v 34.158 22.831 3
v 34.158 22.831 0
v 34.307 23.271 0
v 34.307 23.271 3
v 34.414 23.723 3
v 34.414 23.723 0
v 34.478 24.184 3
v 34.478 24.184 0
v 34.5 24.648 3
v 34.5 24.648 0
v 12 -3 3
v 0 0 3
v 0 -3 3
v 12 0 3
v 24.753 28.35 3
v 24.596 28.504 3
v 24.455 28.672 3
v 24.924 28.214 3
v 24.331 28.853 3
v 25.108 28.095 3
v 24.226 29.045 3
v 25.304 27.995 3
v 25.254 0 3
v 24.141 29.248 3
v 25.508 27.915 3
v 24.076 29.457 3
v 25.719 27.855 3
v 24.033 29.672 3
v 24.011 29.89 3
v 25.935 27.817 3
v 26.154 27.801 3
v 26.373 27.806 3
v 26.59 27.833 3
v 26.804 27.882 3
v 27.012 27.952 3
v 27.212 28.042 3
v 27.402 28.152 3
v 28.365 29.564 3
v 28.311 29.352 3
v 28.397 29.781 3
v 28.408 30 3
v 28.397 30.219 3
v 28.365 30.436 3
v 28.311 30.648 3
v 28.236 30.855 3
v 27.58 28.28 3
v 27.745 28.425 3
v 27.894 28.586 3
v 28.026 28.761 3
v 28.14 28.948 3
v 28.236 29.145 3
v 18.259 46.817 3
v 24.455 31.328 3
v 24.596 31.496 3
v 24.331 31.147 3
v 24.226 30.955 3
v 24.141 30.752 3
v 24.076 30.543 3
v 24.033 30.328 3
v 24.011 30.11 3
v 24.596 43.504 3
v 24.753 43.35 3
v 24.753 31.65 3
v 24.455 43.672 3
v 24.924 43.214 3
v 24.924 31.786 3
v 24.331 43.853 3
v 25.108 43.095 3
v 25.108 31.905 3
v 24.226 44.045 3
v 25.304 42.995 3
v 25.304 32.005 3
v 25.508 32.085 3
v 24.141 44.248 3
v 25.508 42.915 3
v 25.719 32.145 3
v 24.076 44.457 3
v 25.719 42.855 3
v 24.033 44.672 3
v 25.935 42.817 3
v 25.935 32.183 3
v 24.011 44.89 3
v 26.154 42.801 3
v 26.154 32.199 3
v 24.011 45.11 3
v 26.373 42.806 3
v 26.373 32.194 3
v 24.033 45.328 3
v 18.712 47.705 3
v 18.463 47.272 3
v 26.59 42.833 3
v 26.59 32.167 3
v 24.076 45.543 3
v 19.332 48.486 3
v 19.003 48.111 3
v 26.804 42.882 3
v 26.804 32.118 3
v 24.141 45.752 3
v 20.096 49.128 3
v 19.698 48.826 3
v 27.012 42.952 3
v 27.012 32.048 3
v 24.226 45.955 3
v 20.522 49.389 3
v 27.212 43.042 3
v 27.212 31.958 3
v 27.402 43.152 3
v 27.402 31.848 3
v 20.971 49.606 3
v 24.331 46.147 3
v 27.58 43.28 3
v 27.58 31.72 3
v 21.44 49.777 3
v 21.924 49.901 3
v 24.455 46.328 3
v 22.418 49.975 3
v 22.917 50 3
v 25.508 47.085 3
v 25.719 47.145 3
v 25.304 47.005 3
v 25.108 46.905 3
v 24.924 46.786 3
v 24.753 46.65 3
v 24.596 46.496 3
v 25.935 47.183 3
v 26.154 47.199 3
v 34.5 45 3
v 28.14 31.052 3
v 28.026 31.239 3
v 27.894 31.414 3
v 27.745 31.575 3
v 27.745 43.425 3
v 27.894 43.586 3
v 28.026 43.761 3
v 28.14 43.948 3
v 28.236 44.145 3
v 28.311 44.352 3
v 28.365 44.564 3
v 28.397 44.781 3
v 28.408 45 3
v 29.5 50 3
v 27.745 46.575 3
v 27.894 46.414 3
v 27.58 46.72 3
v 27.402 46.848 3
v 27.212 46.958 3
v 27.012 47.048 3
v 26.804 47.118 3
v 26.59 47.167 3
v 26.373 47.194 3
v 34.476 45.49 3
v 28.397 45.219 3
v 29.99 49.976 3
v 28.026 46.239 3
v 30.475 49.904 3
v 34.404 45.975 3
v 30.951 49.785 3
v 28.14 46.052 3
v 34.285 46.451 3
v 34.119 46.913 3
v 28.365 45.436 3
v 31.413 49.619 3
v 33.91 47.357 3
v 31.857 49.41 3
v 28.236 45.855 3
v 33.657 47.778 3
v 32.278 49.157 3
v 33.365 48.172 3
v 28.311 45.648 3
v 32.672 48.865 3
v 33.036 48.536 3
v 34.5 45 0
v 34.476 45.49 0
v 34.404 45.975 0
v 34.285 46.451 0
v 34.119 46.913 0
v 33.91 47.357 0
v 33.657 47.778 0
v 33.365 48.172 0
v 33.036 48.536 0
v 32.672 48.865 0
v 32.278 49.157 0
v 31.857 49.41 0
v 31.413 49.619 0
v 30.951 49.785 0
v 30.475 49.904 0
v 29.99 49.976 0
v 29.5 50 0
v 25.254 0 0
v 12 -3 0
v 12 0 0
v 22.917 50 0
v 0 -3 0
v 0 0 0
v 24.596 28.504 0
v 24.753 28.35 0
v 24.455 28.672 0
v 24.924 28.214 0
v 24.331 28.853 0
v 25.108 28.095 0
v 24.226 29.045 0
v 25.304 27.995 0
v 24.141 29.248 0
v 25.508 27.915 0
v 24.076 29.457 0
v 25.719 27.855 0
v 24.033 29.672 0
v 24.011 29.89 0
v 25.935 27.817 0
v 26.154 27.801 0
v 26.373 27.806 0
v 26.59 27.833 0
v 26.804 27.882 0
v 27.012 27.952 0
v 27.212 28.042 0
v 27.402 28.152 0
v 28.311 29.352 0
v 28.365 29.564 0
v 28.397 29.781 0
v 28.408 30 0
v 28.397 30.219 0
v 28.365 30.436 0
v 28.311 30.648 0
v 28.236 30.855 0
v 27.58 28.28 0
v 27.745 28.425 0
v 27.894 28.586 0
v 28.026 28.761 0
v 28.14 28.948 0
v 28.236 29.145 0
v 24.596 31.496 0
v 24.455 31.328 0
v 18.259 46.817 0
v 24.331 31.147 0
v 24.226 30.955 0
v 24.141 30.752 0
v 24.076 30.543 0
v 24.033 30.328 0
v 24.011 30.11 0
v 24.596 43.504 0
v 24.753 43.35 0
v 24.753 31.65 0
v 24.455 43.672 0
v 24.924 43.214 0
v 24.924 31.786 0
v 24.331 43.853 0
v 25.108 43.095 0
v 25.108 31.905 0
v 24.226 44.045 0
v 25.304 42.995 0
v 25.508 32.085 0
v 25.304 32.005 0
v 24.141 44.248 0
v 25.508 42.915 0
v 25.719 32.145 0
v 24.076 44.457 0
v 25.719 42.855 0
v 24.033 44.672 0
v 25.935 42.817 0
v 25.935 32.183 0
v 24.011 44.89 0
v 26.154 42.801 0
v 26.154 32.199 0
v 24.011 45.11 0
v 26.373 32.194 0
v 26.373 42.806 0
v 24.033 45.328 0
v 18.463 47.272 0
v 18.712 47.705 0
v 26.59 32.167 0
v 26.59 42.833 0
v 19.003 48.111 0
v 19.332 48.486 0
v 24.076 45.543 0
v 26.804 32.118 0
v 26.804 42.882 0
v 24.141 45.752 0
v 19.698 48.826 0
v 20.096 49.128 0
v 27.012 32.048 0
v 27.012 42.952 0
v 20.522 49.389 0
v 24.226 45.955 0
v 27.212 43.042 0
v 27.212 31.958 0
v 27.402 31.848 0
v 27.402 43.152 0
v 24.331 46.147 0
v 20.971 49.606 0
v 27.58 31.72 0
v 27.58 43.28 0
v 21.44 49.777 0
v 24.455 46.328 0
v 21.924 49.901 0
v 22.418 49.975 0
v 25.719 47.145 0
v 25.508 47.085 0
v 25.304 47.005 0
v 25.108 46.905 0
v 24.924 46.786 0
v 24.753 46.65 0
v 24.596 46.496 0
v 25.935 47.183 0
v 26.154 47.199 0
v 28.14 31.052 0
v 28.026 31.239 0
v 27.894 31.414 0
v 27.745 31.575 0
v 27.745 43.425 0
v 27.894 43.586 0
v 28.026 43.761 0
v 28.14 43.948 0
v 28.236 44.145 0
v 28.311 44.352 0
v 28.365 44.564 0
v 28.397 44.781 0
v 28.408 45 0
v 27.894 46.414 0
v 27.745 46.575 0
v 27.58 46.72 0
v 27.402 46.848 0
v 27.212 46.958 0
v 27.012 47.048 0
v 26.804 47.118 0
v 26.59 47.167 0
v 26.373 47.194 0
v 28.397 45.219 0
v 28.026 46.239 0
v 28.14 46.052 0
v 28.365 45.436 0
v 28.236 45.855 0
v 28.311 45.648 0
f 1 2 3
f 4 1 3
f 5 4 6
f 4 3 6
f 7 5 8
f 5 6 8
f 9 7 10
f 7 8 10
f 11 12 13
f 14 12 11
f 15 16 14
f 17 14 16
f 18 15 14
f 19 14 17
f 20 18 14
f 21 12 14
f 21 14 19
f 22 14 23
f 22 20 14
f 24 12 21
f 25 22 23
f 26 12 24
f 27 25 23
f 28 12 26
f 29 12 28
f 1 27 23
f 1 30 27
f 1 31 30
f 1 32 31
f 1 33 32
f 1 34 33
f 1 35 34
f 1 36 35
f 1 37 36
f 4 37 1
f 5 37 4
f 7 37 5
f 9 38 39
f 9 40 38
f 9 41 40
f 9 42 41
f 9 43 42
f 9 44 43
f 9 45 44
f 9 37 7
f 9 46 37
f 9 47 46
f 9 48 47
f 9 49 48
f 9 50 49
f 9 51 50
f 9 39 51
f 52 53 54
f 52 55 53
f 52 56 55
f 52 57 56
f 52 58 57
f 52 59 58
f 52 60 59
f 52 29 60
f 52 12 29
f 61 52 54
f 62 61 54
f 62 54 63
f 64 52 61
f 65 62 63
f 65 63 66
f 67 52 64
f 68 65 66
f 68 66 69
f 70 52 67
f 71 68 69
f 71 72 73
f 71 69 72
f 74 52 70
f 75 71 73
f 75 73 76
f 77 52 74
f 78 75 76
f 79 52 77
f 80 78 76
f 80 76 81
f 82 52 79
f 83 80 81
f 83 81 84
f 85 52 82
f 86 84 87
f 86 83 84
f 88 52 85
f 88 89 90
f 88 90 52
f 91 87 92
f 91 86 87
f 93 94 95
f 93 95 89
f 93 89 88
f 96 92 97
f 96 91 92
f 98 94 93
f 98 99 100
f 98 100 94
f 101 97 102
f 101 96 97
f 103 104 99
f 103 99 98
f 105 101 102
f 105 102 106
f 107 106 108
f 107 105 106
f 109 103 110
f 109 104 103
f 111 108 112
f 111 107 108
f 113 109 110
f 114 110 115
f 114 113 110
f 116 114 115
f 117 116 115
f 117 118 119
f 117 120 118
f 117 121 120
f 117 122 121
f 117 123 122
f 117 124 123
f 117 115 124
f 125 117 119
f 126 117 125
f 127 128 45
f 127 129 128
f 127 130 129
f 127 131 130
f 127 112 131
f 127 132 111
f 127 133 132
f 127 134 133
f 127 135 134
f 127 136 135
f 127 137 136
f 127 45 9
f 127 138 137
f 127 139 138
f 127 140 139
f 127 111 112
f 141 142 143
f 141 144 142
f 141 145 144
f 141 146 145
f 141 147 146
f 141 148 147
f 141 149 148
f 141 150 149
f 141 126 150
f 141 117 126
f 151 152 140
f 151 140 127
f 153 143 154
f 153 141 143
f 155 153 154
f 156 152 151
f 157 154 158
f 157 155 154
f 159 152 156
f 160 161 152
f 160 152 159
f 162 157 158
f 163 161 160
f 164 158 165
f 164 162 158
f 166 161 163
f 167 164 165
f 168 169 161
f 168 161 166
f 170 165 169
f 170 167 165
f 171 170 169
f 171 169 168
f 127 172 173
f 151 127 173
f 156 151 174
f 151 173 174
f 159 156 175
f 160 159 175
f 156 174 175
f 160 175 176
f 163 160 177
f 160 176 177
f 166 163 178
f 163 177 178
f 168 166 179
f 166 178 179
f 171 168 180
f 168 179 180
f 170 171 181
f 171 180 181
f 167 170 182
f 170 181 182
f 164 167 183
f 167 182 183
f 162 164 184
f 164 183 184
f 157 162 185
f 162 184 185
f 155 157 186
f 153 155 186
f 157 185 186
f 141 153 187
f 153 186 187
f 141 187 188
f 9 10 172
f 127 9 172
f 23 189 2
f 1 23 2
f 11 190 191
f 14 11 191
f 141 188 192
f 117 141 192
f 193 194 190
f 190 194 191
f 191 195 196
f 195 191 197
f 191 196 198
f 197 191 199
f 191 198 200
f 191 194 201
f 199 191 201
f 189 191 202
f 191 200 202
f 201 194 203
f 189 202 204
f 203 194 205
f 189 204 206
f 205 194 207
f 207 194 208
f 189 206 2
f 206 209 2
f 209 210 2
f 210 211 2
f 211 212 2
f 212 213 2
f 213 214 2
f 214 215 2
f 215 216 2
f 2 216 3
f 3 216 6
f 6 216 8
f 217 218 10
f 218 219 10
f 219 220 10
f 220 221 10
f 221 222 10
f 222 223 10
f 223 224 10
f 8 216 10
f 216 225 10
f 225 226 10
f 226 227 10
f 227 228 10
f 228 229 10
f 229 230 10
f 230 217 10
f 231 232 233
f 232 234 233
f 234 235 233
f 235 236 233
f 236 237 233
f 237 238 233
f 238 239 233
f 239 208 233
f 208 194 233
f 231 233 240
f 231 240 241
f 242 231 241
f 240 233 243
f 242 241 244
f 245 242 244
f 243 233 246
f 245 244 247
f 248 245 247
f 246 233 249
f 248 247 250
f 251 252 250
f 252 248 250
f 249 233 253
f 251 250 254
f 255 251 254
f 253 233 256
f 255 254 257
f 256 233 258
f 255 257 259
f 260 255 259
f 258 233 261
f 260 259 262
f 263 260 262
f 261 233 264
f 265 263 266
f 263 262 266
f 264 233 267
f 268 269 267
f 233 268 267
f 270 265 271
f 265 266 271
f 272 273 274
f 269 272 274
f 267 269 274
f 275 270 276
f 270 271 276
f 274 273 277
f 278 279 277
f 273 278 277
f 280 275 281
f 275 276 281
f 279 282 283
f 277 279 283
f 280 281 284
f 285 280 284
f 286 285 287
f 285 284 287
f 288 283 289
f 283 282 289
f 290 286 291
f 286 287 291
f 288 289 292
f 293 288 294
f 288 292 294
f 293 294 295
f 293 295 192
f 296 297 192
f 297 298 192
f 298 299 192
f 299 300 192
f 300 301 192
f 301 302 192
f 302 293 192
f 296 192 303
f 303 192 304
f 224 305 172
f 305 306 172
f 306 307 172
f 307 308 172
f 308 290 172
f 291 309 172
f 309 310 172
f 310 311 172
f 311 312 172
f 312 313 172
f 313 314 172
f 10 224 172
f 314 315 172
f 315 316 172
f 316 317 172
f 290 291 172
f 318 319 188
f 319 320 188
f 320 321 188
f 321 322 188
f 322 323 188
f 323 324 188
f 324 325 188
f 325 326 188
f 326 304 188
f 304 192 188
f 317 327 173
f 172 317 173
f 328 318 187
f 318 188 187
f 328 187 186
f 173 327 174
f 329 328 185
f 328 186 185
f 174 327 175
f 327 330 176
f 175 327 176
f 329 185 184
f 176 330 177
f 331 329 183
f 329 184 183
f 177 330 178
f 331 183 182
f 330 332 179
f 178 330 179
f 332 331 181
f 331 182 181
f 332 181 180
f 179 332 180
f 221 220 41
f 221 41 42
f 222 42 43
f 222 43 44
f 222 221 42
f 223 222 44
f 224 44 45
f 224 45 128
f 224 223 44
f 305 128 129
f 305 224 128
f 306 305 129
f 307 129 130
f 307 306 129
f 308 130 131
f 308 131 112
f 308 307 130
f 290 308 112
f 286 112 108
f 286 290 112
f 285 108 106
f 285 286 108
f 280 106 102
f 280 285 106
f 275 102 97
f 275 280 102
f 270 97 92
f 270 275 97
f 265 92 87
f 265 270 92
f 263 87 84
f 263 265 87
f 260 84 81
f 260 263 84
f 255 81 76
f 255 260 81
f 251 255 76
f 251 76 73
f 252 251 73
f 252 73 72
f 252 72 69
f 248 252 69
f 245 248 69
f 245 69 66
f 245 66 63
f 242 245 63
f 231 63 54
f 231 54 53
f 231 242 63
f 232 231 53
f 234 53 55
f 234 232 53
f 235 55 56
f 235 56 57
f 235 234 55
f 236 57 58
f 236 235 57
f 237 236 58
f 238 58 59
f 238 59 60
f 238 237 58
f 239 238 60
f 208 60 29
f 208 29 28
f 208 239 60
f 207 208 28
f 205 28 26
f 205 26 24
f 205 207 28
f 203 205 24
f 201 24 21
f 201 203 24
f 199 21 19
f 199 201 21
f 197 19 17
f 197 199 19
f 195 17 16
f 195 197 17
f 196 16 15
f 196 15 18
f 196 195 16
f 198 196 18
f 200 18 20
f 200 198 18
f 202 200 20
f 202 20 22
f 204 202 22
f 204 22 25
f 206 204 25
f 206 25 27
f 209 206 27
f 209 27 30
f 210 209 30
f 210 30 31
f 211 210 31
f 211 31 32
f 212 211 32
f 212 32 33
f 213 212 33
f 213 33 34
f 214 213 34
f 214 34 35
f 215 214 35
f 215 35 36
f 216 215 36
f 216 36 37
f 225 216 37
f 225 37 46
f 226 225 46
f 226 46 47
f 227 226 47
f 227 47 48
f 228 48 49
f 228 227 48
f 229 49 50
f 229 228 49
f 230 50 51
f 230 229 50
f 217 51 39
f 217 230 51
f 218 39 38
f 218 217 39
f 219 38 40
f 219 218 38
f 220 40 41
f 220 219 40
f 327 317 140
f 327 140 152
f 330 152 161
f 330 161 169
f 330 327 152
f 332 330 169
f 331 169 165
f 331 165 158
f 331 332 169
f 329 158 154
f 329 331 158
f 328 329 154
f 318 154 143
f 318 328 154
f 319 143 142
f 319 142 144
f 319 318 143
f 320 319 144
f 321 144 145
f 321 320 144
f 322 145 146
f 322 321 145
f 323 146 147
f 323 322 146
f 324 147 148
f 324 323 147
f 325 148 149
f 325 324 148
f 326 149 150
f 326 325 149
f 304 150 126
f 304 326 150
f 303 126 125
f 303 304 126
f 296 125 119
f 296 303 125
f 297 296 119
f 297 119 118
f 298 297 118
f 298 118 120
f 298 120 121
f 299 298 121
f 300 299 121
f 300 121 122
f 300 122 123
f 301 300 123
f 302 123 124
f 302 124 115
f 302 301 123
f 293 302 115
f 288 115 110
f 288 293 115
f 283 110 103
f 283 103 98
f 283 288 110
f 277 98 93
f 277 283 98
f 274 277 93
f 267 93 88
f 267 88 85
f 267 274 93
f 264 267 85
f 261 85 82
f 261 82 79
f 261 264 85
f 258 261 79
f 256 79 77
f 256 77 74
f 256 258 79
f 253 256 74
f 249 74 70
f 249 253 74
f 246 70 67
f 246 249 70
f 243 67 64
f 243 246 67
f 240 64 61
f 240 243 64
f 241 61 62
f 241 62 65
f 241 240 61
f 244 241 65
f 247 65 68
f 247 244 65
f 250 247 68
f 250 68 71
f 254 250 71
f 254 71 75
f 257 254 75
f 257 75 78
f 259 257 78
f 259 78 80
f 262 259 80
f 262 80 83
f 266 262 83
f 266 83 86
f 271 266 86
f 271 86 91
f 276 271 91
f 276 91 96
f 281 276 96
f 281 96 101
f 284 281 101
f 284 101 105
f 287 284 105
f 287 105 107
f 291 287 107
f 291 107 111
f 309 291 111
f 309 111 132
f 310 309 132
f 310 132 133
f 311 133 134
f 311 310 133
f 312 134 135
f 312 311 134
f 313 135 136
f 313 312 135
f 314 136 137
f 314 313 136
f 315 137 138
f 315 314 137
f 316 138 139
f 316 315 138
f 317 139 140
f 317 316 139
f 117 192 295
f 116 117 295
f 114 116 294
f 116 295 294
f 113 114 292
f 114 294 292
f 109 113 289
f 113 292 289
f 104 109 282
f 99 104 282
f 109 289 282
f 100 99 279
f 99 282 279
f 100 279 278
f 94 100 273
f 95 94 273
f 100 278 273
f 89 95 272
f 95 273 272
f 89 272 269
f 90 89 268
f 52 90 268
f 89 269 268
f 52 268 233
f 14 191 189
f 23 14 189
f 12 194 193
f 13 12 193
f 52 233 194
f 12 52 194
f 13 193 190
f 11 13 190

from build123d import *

# Parameters (mm, degrees)
SKETCH1_R           = 2.2
BOSS_EXTRUDE1_DEPTH = 3


with BuildPart() as part:
    # Sketch1 → Boss-Extrude1 (new body)
    with BuildSketch(Plane.XY):
        with BuildLine():
            Line((18.258523289, 46.816726382), (0, 0))
            Line((0, 0), (0, -3))
            Line((0, -3), (12, -3))
            Line((12, -3), (12, 0))
            Line((12, 0), (25.254184663, 0))
            Line((25.254184663, 0), (34.158272776, 22.830995159))
            ThreePointArc((34.158272776, 22.830995159), (34.413825591, 23.723428265), (34.5, 24.647721542))
            Line((34.5, 24.647721542), (34.5, 45))
            ThreePointArc((34.5, 45), (33.035533906, 48.535533906), (29.5, 50))
            Line((29.5, 50), (22.916796065, 50))
            ThreePointArc((22.916796065, 50), (20.095770711, 49.128173441), (18.258523289, 46.816726382))
        make_face()
        with Locations((26.208398032, 30)):
            Circle(SKETCH1_R, mode=Mode.SUBTRACT)
        with Locations((26.208398032, 45)):
            Circle(SKETCH1_R, mode=Mode.SUBTRACT)
    extrude(amount=BOSS_EXTRUDE1_DEPTH)


solid = part.part
